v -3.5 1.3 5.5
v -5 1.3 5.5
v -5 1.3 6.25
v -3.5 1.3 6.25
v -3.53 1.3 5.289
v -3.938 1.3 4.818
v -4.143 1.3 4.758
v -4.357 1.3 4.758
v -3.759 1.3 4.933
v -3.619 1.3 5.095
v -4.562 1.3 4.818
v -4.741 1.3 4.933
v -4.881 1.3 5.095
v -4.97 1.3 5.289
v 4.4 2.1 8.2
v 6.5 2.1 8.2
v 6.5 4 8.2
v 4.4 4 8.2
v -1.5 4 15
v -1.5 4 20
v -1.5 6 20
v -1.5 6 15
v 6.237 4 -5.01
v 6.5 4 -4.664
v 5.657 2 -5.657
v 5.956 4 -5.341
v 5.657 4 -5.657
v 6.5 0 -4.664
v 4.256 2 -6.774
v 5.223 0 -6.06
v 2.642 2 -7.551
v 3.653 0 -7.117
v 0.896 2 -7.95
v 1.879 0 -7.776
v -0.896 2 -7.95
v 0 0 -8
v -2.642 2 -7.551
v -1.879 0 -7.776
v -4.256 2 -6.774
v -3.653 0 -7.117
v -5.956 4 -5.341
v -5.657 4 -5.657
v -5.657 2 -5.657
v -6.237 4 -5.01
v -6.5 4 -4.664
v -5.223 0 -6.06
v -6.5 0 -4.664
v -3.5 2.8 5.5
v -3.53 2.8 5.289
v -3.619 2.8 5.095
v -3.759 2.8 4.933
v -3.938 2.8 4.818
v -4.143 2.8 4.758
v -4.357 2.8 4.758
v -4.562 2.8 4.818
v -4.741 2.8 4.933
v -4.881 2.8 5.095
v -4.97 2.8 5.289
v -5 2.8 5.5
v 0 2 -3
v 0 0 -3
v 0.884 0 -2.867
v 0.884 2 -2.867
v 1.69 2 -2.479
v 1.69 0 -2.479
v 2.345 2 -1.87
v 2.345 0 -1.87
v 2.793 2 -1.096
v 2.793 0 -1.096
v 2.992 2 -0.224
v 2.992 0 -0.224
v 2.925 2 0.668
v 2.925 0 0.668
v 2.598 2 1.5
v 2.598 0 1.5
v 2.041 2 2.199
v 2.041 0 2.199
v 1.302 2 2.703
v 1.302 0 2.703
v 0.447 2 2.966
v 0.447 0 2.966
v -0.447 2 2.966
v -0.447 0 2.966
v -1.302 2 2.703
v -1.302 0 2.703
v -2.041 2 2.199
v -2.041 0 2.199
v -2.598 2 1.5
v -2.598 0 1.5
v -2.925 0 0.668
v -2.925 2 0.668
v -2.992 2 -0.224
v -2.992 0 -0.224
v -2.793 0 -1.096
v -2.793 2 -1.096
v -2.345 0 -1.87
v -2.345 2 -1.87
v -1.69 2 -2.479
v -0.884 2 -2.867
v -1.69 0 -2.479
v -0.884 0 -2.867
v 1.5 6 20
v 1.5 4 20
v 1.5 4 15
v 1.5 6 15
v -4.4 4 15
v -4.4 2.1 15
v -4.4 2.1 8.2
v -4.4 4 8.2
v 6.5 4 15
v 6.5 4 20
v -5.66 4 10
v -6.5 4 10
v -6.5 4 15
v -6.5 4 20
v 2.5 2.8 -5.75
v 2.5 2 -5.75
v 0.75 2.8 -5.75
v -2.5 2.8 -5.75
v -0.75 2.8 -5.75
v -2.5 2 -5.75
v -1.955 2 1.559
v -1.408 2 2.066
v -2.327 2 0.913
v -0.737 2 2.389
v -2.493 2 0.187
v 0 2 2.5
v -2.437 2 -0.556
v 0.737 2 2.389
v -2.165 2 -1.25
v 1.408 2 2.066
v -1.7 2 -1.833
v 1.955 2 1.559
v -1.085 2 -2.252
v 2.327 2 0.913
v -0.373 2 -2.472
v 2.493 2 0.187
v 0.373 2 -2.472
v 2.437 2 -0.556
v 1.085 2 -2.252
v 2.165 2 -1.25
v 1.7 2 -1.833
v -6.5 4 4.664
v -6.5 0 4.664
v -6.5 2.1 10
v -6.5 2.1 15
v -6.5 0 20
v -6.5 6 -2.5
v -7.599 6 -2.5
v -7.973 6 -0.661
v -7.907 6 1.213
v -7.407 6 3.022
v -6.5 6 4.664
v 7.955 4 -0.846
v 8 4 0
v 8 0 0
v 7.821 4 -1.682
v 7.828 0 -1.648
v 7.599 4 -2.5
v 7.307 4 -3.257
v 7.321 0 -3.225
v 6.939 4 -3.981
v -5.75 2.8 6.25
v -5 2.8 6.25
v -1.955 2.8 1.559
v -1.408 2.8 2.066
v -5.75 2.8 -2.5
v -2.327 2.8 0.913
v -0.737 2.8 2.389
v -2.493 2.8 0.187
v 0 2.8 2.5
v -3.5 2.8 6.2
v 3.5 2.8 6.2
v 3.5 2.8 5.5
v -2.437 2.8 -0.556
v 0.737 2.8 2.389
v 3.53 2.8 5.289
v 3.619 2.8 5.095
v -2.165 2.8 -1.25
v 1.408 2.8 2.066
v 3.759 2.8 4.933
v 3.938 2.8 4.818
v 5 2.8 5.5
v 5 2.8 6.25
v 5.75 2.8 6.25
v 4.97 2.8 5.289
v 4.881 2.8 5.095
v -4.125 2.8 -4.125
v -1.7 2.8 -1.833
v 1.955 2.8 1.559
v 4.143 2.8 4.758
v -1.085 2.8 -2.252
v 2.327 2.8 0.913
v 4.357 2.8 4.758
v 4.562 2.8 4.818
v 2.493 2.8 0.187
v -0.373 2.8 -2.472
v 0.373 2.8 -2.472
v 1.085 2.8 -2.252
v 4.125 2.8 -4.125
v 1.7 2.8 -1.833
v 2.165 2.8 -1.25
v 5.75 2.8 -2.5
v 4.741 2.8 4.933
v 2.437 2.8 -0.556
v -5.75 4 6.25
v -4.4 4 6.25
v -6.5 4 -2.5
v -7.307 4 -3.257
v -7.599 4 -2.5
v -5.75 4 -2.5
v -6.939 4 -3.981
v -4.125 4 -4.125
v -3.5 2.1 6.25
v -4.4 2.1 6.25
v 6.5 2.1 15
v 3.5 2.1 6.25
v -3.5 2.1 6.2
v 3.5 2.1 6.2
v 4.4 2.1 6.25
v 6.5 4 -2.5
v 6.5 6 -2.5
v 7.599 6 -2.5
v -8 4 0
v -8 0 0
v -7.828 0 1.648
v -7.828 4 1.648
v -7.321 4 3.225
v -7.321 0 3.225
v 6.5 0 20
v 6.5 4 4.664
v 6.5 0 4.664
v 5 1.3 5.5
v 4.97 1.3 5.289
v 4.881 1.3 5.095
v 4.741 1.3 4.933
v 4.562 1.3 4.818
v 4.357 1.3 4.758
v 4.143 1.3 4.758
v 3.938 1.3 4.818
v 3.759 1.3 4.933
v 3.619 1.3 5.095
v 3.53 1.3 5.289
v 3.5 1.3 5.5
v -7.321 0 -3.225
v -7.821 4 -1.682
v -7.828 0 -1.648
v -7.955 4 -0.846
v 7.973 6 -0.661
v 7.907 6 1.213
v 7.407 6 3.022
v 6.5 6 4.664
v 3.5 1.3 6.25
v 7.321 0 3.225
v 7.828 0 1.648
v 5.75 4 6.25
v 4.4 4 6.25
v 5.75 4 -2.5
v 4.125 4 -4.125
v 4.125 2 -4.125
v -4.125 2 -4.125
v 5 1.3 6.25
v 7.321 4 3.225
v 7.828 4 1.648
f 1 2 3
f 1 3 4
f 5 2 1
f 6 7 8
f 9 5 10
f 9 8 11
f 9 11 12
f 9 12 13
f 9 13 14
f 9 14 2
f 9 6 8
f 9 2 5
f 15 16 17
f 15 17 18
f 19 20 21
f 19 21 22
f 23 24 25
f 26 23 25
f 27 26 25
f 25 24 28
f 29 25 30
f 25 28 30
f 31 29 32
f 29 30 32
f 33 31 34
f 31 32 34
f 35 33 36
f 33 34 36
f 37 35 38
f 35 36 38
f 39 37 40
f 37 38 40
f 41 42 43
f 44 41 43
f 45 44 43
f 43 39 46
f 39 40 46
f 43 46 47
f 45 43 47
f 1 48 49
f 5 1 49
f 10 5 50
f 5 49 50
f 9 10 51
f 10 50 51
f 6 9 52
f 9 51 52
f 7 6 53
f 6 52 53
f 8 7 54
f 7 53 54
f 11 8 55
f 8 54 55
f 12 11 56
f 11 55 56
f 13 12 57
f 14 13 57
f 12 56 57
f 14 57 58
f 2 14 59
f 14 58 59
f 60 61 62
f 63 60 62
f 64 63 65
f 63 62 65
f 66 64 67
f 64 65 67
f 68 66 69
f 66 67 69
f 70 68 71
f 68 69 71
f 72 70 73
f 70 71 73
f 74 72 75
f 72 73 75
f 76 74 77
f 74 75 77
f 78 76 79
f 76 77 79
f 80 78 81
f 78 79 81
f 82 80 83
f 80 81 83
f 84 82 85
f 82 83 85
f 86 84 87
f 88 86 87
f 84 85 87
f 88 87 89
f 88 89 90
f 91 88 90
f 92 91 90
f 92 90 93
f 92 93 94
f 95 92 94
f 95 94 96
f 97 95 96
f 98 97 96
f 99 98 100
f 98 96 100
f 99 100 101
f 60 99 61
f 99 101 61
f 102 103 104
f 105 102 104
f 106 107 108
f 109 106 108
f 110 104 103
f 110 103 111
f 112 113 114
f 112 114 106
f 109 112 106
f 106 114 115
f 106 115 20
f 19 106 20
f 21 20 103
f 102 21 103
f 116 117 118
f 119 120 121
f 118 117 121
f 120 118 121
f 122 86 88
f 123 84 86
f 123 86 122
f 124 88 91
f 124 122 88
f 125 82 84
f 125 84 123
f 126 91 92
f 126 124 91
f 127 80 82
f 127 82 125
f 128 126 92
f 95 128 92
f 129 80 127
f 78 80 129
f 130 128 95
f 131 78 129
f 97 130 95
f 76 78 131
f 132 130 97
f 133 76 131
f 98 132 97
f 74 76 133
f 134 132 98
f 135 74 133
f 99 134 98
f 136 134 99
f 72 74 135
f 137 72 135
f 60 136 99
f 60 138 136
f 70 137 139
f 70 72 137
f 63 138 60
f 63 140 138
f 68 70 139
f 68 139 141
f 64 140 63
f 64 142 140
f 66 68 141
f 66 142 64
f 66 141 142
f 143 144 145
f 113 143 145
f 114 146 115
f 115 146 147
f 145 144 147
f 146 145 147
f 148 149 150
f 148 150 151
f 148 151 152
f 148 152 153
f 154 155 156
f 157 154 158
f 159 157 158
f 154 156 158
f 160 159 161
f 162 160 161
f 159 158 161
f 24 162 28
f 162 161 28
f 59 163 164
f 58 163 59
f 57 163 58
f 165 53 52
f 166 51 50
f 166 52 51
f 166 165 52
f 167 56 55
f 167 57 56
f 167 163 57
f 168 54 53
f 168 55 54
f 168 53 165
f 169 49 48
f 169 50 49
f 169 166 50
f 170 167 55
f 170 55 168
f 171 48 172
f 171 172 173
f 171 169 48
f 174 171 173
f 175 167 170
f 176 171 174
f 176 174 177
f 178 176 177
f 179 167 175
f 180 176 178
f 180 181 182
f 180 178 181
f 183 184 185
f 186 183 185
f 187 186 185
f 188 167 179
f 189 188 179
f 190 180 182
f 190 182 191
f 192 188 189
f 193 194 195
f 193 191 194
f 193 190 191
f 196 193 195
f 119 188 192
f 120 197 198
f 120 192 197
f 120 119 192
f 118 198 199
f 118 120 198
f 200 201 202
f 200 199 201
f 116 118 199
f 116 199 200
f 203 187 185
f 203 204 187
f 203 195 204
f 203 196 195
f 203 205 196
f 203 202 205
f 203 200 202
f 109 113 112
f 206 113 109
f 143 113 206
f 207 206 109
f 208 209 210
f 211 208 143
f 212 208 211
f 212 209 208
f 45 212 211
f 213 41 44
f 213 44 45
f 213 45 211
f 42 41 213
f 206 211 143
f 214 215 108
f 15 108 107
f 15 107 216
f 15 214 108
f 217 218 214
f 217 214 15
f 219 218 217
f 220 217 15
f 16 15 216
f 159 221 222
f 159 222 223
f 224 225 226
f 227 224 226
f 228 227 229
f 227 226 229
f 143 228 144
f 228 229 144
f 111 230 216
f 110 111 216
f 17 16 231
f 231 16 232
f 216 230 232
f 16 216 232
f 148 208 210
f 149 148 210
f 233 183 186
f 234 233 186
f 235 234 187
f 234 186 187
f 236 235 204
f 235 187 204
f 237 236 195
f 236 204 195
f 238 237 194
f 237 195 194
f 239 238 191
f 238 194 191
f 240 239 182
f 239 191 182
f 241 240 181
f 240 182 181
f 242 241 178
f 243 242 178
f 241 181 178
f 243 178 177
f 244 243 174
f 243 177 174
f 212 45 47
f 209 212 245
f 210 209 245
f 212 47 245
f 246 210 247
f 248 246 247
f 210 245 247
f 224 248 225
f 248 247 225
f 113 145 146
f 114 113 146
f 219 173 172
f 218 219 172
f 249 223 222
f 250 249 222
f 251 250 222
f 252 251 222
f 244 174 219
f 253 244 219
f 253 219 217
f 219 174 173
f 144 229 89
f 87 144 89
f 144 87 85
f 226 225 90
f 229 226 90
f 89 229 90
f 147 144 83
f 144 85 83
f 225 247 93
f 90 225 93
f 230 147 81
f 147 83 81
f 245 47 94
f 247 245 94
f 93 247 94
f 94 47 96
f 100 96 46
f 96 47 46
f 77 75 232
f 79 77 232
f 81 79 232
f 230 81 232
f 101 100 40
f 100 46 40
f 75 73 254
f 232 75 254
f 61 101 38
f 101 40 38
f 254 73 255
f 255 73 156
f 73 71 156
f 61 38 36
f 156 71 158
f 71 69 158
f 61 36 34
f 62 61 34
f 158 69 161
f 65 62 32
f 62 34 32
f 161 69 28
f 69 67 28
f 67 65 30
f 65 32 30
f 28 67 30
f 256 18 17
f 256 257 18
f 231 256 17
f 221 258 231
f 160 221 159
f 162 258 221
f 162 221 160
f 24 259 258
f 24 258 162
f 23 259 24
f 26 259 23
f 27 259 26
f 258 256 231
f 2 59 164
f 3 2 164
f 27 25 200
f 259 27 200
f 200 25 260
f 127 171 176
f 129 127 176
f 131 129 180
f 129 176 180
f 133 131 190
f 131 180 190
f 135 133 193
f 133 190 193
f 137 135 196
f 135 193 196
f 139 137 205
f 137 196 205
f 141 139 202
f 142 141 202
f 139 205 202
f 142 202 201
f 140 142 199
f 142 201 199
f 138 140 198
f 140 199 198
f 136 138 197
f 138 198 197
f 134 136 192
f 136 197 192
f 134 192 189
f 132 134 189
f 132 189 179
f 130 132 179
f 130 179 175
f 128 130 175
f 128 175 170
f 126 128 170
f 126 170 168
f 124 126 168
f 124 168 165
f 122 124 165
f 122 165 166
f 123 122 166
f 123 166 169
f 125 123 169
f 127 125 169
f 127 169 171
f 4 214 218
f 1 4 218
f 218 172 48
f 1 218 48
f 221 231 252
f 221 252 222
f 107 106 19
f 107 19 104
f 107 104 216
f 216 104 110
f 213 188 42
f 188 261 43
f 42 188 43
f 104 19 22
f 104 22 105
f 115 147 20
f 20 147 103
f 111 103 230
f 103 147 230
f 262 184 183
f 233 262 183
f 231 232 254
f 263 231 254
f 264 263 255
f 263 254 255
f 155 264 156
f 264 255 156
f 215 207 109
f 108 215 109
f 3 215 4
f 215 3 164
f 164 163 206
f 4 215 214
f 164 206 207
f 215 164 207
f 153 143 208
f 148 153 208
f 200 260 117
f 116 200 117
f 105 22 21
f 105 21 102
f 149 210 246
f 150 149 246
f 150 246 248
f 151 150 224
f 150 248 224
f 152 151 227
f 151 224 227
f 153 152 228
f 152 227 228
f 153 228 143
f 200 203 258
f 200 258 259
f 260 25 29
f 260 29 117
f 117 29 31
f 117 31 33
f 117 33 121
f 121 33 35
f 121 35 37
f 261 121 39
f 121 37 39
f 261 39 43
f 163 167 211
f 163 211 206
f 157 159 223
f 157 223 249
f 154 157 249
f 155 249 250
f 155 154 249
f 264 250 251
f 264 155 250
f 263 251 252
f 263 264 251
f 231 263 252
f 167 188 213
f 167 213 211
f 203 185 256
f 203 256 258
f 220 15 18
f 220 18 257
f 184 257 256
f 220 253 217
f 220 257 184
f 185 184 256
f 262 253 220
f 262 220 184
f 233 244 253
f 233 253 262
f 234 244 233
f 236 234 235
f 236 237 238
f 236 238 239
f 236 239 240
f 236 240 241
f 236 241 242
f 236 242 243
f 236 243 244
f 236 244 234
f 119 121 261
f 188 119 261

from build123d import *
from build123d.topology import SkipClean

# Parameters (mm, degrees)
BOSS_EXTRUDE1_DEPTH = 4
SKETCH2_R           = 3
CUT_EXTRUDE1_DEPTH  = 2
SKETCH3_R           = 1.5
CUT_EXTRUDE2_DEPTH  = 22.633307653
CUT_EXTRUDE4_START  = -1.2
CUT_EXTRUDE4_DEPTH  = 1.2
CUT_EXTRUDE6_DEPTH  = 1.5
CUT_EXTRUDE7_DEPTH  = 0.7
BOSS_EXTRUDE3_DEPTH = 2
CUT_EXTRUDE12_START = -2
CUT_EXTRUDE12_DEPTH = 2
SKETCH6_R           = 2.5
CUT_EXTRUDE13_DEPTH = 22.777052142
SKETCH16_W          = 3
SKETCH16_H          = 5
BOSS_EXTRUDE4_DEPTH = 2
BOSS_EXTRUDE6_DEPTH = 1.9


with BuildPart() as part:
    # Sketch1 → Boss-Extrude1 (new body)
    with BuildSketch(Plane(origin=(0, 0, 0), x_dir=(1, 0, 0), z_dir=(0, 1, 0))):
        with BuildLine():
            Line((6.5, -20), (6.5, -4.663689527))
            ThreePointArc((6.5, -4.663689527), (7.615773106, -2.449489743), (8, 0))
            ThreePointArc((8, 0), (7.615773106, 2.449489743), (6.5, 4.663689527))
            ThreePointArc((6.5, 4.663689527), (0, 8), (-6.5, 4.663689527))
            ThreePointArc((-6.5, 4.663689527), (-7.615773106, 2.449489743), (-8, 0))
            ThreePointArc((-8, 0), (-7.615773106, -2.449489743), (-6.5, -4.663689527))
            Line((-6.5, -4.663689527), (-6.5, -20))
            Line((-6.5, -20), (6.5, -20))
        make_face()
    extrude(amount=BOSS_EXTRUDE1_DEPTH)

    # Sketch2 → Cut-Extrude1 (cut)
    with BuildSketch(Plane.XZ):
        with Locations(Location((0, 0, 0), (0, 0, 270))):
            Circle(SKETCH2_R)
    extrude(amount=-CUT_EXTRUDE1_DEPTH, mode=Mode.SUBTRACT)

    # Sketch3 → Cut-Extrude2 (cut, through all)
    with BuildSketch(Plane.XZ.offset(-2)):
        with Locations(Location((0, 0, 0), (0, 0, 270))):
            Circle(SKETCH3_R)
    extrude(amount=-CUT_EXTRUDE2_DEPTH, mode=Mode.SUBTRACT)

    # Sketch5 → Cut-Extrude4 (cut)
    with BuildSketch(Plane(origin=(0, 4, 0), x_dir=(1, 0, 0), z_dir=(0, 1, 0)).offset(CUT_EXTRUDE4_START)):
        with BuildLine():
            Line((5.75, 2.5), (2.5, 5.75))
            Line((2.5, 5.75), (0.75, 5.75))
            Line((0.75, 5.75), (0.75, 7.964766161))
            ThreePointArc((0.75, 7.964766161), (0, 8), (-0.75, 7.964766161))
            Line((-0.75, 7.964766161), (-0.75, 5.75))
            Line((-0.75, 5.75), (-2.5, 5.75))
            Line((-2.5, 5.75), (-5.75, 2.5))
            Line((-5.75, 2.5), (-5.75, -6.25))
            Line((-5.75, -6.25), (-4.4, -6.25))
            Line((-4.4, -6.25), (-4.4, -8.2))
            Line((-4.4, -8.2), (-5.66, -10))
            Line((-5.66, -10), (-6.5, -10))
            Line((-6.5, -10), (-6.5, -11.2))
            Line((-6.5, -11.2), (-6.5, -15))
            Line((-6.5, -15), (6.5, -15))
            Line((6.5, -15), (6.5, -11.2))
            Line((6.5, -11.2), (6.5, -10))
            Line((6.5, -10), (6.5, -8.2))
            Line((6.5, -8.2), (4.4, -8.2))
            Line((4.4, -8.2), (4.4, -6.25))
            Line((4.4, -6.25), (5.75, -6.25))
            Line((5.75, -6.25), (5.75, 2.5))
        make_face()
    extrude(amount=CUT_EXTRUDE4_DEPTH, mode=Mode.SUBTRACT)

    # Sketch7 → Cut-Extrude6 (cut)
    with BuildSketch(Plane(origin=(0, 2.8, 0), x_dir=(1, 0, 0), z_dir=(0, 1, 0))):
        with BuildLine():
            Line((-4.999999999, -5.5), (-4.999999999, -6.25))
            Line((-4.999999999, -6.25), (-3.499999999, -6.25))
            Line((-3.499999999, -6.25), (-3.499999999, -5.5))
            ThreePointArc((-3.499999999, -5.5), (-4.249999999, -4.75), (-4.999999999, -5.5))
        make_face()
        with BuildLine():
            Line((3.500000001, -5.5), (3.500000001, -6.25))
            Line((3.500000001, -6.25), (5.000000001, -6.25))
            Line((5.000000001, -6.25), (5.000000001, -5.5))
            ThreePointArc((5.000000001, -5.5), (4.250000001, -4.75), (3.500000001, -5.5))
        make_face()
    extrude(amount=-CUT_EXTRUDE6_DEPTH, mode=Mode.SUBTRACT)

    # Sketch9 → Cut-Extrude7 (cut)
    with BuildSketch(Plane(origin=(0, 2.8, 0), x_dir=(1, 0, 0), z_dir=(0, 1, 0))):
        Polygon((-6.5, -15), (6.5, -15), (6.5, -8.2), (4.4, -8.2), (4.4, -6.2), (-4.4, -6.2), (-4.4, -8.2), (-5.66, -10), (-6.5, -10), align=None)
    extrude(amount=-CUT_EXTRUDE7_DEPTH, mode=Mode.SUBTRACT)

    # Sketch14 → Boss-Extrude3 (add)
    with SkipClean():  # the faces are left unmerged after this step: merging them gives an invalid solid
        with BuildSketch(Plane(origin=(0, 4, 0), x_dir=(1, 0, 0), z_dir=(0, 1, 0))):
            with BuildLine():
                Line((6.5, -4.663689527), (6.5, 2.5))
                Line((6.5, 2.5), (7.599342077, 2.5))
                ThreePointArc((7.599342077, 2.5), (7.907431546, -1.213476964), (6.5, -4.663689527))
            make_face()
            with BuildLine():
                Line((-6.5, -4.663689527), (-6.5, 2.5))
                Line((-6.5, 2.5), (-7.599342077, 2.5))
                ThreePointArc((-7.599342077, 2.5), (-7.907431546, -1.213476964), (-6.5, -4.663689527))
            make_face()
        extrude(amount=BOSS_EXTRUDE3_DEPTH)

    # Sketch15 → Cut-Extrude12 (cut)
    with SkipClean():  # the faces are left unmerged after this step: merging them gives an invalid solid
        with BuildSketch(Plane(origin=(0, 4, 0), x_dir=(1, 0, 0), z_dir=(0, 1, 0)).offset(CUT_EXTRUDE12_START)):
            with BuildLine():
                Line((2.5, 5.75), (-2.5, 5.75))
                Line((-2.5, 5.75), (-4.125, 4.125))
                Line((-4.125, 4.125), (-5.656854249, 5.656854249))
                ThreePointArc((-5.656854249, 5.656854249), (0, 8), (5.656854249, 5.656854249))
                Line((5.656854249, 5.656854249), (4.125, 4.125))
                Line((4.125, 4.125), (2.5, 5.75))
            make_face()
        extrude(amount=CUT_EXTRUDE12_DEPTH, mode=Mode.SUBTRACT)

    # Sketch6 → Cut-Extrude13 (cut, through all)
    with SkipClean():  # the faces are left unmerged after this step: merging them gives an invalid solid
        with BuildSketch(Plane(origin=(0, 2.8, 0), x_dir=(1, 0, 0), z_dir=(0, 1, 0))):
            with Locations(Location((0, 0, 0), (0, 0, 270))):
                Circle(SKETCH6_R)
        extrude(amount=-CUT_EXTRUDE13_DEPTH, mode=Mode.SUBTRACT)

    # Sketch16 → Boss-Extrude4 (add)
    with SkipClean():  # the faces are left unmerged after this step: merging them gives an invalid solid
        with BuildSketch(Plane(origin=(0, 4, 0), x_dir=(1, 0, 0), z_dir=(0, 1, 0))):
            with Locations((0, -17.5)):
                Rectangle(SKETCH16_W, SKETCH16_H)
        extrude(amount=BOSS_EXTRUDE4_DEPTH)

    # Sketch18 → Boss-Extrude6 (add)
    with SkipClean():  # the faces are left unmerged after this step: merging them gives an invalid solid
        with BuildSketch(Plane(origin=(0, 2.1, 0), x_dir=(1, 0, 0), z_dir=(0, 1, 0))):
            Polygon((-4.4, -8.2), (-5.66, -10), (-6.5, -10), (-6.5, -15), (-4.4, -15), align=None)
        extrude(amount=BOSS_EXTRUDE6_DEPTH)


solid = part.part
